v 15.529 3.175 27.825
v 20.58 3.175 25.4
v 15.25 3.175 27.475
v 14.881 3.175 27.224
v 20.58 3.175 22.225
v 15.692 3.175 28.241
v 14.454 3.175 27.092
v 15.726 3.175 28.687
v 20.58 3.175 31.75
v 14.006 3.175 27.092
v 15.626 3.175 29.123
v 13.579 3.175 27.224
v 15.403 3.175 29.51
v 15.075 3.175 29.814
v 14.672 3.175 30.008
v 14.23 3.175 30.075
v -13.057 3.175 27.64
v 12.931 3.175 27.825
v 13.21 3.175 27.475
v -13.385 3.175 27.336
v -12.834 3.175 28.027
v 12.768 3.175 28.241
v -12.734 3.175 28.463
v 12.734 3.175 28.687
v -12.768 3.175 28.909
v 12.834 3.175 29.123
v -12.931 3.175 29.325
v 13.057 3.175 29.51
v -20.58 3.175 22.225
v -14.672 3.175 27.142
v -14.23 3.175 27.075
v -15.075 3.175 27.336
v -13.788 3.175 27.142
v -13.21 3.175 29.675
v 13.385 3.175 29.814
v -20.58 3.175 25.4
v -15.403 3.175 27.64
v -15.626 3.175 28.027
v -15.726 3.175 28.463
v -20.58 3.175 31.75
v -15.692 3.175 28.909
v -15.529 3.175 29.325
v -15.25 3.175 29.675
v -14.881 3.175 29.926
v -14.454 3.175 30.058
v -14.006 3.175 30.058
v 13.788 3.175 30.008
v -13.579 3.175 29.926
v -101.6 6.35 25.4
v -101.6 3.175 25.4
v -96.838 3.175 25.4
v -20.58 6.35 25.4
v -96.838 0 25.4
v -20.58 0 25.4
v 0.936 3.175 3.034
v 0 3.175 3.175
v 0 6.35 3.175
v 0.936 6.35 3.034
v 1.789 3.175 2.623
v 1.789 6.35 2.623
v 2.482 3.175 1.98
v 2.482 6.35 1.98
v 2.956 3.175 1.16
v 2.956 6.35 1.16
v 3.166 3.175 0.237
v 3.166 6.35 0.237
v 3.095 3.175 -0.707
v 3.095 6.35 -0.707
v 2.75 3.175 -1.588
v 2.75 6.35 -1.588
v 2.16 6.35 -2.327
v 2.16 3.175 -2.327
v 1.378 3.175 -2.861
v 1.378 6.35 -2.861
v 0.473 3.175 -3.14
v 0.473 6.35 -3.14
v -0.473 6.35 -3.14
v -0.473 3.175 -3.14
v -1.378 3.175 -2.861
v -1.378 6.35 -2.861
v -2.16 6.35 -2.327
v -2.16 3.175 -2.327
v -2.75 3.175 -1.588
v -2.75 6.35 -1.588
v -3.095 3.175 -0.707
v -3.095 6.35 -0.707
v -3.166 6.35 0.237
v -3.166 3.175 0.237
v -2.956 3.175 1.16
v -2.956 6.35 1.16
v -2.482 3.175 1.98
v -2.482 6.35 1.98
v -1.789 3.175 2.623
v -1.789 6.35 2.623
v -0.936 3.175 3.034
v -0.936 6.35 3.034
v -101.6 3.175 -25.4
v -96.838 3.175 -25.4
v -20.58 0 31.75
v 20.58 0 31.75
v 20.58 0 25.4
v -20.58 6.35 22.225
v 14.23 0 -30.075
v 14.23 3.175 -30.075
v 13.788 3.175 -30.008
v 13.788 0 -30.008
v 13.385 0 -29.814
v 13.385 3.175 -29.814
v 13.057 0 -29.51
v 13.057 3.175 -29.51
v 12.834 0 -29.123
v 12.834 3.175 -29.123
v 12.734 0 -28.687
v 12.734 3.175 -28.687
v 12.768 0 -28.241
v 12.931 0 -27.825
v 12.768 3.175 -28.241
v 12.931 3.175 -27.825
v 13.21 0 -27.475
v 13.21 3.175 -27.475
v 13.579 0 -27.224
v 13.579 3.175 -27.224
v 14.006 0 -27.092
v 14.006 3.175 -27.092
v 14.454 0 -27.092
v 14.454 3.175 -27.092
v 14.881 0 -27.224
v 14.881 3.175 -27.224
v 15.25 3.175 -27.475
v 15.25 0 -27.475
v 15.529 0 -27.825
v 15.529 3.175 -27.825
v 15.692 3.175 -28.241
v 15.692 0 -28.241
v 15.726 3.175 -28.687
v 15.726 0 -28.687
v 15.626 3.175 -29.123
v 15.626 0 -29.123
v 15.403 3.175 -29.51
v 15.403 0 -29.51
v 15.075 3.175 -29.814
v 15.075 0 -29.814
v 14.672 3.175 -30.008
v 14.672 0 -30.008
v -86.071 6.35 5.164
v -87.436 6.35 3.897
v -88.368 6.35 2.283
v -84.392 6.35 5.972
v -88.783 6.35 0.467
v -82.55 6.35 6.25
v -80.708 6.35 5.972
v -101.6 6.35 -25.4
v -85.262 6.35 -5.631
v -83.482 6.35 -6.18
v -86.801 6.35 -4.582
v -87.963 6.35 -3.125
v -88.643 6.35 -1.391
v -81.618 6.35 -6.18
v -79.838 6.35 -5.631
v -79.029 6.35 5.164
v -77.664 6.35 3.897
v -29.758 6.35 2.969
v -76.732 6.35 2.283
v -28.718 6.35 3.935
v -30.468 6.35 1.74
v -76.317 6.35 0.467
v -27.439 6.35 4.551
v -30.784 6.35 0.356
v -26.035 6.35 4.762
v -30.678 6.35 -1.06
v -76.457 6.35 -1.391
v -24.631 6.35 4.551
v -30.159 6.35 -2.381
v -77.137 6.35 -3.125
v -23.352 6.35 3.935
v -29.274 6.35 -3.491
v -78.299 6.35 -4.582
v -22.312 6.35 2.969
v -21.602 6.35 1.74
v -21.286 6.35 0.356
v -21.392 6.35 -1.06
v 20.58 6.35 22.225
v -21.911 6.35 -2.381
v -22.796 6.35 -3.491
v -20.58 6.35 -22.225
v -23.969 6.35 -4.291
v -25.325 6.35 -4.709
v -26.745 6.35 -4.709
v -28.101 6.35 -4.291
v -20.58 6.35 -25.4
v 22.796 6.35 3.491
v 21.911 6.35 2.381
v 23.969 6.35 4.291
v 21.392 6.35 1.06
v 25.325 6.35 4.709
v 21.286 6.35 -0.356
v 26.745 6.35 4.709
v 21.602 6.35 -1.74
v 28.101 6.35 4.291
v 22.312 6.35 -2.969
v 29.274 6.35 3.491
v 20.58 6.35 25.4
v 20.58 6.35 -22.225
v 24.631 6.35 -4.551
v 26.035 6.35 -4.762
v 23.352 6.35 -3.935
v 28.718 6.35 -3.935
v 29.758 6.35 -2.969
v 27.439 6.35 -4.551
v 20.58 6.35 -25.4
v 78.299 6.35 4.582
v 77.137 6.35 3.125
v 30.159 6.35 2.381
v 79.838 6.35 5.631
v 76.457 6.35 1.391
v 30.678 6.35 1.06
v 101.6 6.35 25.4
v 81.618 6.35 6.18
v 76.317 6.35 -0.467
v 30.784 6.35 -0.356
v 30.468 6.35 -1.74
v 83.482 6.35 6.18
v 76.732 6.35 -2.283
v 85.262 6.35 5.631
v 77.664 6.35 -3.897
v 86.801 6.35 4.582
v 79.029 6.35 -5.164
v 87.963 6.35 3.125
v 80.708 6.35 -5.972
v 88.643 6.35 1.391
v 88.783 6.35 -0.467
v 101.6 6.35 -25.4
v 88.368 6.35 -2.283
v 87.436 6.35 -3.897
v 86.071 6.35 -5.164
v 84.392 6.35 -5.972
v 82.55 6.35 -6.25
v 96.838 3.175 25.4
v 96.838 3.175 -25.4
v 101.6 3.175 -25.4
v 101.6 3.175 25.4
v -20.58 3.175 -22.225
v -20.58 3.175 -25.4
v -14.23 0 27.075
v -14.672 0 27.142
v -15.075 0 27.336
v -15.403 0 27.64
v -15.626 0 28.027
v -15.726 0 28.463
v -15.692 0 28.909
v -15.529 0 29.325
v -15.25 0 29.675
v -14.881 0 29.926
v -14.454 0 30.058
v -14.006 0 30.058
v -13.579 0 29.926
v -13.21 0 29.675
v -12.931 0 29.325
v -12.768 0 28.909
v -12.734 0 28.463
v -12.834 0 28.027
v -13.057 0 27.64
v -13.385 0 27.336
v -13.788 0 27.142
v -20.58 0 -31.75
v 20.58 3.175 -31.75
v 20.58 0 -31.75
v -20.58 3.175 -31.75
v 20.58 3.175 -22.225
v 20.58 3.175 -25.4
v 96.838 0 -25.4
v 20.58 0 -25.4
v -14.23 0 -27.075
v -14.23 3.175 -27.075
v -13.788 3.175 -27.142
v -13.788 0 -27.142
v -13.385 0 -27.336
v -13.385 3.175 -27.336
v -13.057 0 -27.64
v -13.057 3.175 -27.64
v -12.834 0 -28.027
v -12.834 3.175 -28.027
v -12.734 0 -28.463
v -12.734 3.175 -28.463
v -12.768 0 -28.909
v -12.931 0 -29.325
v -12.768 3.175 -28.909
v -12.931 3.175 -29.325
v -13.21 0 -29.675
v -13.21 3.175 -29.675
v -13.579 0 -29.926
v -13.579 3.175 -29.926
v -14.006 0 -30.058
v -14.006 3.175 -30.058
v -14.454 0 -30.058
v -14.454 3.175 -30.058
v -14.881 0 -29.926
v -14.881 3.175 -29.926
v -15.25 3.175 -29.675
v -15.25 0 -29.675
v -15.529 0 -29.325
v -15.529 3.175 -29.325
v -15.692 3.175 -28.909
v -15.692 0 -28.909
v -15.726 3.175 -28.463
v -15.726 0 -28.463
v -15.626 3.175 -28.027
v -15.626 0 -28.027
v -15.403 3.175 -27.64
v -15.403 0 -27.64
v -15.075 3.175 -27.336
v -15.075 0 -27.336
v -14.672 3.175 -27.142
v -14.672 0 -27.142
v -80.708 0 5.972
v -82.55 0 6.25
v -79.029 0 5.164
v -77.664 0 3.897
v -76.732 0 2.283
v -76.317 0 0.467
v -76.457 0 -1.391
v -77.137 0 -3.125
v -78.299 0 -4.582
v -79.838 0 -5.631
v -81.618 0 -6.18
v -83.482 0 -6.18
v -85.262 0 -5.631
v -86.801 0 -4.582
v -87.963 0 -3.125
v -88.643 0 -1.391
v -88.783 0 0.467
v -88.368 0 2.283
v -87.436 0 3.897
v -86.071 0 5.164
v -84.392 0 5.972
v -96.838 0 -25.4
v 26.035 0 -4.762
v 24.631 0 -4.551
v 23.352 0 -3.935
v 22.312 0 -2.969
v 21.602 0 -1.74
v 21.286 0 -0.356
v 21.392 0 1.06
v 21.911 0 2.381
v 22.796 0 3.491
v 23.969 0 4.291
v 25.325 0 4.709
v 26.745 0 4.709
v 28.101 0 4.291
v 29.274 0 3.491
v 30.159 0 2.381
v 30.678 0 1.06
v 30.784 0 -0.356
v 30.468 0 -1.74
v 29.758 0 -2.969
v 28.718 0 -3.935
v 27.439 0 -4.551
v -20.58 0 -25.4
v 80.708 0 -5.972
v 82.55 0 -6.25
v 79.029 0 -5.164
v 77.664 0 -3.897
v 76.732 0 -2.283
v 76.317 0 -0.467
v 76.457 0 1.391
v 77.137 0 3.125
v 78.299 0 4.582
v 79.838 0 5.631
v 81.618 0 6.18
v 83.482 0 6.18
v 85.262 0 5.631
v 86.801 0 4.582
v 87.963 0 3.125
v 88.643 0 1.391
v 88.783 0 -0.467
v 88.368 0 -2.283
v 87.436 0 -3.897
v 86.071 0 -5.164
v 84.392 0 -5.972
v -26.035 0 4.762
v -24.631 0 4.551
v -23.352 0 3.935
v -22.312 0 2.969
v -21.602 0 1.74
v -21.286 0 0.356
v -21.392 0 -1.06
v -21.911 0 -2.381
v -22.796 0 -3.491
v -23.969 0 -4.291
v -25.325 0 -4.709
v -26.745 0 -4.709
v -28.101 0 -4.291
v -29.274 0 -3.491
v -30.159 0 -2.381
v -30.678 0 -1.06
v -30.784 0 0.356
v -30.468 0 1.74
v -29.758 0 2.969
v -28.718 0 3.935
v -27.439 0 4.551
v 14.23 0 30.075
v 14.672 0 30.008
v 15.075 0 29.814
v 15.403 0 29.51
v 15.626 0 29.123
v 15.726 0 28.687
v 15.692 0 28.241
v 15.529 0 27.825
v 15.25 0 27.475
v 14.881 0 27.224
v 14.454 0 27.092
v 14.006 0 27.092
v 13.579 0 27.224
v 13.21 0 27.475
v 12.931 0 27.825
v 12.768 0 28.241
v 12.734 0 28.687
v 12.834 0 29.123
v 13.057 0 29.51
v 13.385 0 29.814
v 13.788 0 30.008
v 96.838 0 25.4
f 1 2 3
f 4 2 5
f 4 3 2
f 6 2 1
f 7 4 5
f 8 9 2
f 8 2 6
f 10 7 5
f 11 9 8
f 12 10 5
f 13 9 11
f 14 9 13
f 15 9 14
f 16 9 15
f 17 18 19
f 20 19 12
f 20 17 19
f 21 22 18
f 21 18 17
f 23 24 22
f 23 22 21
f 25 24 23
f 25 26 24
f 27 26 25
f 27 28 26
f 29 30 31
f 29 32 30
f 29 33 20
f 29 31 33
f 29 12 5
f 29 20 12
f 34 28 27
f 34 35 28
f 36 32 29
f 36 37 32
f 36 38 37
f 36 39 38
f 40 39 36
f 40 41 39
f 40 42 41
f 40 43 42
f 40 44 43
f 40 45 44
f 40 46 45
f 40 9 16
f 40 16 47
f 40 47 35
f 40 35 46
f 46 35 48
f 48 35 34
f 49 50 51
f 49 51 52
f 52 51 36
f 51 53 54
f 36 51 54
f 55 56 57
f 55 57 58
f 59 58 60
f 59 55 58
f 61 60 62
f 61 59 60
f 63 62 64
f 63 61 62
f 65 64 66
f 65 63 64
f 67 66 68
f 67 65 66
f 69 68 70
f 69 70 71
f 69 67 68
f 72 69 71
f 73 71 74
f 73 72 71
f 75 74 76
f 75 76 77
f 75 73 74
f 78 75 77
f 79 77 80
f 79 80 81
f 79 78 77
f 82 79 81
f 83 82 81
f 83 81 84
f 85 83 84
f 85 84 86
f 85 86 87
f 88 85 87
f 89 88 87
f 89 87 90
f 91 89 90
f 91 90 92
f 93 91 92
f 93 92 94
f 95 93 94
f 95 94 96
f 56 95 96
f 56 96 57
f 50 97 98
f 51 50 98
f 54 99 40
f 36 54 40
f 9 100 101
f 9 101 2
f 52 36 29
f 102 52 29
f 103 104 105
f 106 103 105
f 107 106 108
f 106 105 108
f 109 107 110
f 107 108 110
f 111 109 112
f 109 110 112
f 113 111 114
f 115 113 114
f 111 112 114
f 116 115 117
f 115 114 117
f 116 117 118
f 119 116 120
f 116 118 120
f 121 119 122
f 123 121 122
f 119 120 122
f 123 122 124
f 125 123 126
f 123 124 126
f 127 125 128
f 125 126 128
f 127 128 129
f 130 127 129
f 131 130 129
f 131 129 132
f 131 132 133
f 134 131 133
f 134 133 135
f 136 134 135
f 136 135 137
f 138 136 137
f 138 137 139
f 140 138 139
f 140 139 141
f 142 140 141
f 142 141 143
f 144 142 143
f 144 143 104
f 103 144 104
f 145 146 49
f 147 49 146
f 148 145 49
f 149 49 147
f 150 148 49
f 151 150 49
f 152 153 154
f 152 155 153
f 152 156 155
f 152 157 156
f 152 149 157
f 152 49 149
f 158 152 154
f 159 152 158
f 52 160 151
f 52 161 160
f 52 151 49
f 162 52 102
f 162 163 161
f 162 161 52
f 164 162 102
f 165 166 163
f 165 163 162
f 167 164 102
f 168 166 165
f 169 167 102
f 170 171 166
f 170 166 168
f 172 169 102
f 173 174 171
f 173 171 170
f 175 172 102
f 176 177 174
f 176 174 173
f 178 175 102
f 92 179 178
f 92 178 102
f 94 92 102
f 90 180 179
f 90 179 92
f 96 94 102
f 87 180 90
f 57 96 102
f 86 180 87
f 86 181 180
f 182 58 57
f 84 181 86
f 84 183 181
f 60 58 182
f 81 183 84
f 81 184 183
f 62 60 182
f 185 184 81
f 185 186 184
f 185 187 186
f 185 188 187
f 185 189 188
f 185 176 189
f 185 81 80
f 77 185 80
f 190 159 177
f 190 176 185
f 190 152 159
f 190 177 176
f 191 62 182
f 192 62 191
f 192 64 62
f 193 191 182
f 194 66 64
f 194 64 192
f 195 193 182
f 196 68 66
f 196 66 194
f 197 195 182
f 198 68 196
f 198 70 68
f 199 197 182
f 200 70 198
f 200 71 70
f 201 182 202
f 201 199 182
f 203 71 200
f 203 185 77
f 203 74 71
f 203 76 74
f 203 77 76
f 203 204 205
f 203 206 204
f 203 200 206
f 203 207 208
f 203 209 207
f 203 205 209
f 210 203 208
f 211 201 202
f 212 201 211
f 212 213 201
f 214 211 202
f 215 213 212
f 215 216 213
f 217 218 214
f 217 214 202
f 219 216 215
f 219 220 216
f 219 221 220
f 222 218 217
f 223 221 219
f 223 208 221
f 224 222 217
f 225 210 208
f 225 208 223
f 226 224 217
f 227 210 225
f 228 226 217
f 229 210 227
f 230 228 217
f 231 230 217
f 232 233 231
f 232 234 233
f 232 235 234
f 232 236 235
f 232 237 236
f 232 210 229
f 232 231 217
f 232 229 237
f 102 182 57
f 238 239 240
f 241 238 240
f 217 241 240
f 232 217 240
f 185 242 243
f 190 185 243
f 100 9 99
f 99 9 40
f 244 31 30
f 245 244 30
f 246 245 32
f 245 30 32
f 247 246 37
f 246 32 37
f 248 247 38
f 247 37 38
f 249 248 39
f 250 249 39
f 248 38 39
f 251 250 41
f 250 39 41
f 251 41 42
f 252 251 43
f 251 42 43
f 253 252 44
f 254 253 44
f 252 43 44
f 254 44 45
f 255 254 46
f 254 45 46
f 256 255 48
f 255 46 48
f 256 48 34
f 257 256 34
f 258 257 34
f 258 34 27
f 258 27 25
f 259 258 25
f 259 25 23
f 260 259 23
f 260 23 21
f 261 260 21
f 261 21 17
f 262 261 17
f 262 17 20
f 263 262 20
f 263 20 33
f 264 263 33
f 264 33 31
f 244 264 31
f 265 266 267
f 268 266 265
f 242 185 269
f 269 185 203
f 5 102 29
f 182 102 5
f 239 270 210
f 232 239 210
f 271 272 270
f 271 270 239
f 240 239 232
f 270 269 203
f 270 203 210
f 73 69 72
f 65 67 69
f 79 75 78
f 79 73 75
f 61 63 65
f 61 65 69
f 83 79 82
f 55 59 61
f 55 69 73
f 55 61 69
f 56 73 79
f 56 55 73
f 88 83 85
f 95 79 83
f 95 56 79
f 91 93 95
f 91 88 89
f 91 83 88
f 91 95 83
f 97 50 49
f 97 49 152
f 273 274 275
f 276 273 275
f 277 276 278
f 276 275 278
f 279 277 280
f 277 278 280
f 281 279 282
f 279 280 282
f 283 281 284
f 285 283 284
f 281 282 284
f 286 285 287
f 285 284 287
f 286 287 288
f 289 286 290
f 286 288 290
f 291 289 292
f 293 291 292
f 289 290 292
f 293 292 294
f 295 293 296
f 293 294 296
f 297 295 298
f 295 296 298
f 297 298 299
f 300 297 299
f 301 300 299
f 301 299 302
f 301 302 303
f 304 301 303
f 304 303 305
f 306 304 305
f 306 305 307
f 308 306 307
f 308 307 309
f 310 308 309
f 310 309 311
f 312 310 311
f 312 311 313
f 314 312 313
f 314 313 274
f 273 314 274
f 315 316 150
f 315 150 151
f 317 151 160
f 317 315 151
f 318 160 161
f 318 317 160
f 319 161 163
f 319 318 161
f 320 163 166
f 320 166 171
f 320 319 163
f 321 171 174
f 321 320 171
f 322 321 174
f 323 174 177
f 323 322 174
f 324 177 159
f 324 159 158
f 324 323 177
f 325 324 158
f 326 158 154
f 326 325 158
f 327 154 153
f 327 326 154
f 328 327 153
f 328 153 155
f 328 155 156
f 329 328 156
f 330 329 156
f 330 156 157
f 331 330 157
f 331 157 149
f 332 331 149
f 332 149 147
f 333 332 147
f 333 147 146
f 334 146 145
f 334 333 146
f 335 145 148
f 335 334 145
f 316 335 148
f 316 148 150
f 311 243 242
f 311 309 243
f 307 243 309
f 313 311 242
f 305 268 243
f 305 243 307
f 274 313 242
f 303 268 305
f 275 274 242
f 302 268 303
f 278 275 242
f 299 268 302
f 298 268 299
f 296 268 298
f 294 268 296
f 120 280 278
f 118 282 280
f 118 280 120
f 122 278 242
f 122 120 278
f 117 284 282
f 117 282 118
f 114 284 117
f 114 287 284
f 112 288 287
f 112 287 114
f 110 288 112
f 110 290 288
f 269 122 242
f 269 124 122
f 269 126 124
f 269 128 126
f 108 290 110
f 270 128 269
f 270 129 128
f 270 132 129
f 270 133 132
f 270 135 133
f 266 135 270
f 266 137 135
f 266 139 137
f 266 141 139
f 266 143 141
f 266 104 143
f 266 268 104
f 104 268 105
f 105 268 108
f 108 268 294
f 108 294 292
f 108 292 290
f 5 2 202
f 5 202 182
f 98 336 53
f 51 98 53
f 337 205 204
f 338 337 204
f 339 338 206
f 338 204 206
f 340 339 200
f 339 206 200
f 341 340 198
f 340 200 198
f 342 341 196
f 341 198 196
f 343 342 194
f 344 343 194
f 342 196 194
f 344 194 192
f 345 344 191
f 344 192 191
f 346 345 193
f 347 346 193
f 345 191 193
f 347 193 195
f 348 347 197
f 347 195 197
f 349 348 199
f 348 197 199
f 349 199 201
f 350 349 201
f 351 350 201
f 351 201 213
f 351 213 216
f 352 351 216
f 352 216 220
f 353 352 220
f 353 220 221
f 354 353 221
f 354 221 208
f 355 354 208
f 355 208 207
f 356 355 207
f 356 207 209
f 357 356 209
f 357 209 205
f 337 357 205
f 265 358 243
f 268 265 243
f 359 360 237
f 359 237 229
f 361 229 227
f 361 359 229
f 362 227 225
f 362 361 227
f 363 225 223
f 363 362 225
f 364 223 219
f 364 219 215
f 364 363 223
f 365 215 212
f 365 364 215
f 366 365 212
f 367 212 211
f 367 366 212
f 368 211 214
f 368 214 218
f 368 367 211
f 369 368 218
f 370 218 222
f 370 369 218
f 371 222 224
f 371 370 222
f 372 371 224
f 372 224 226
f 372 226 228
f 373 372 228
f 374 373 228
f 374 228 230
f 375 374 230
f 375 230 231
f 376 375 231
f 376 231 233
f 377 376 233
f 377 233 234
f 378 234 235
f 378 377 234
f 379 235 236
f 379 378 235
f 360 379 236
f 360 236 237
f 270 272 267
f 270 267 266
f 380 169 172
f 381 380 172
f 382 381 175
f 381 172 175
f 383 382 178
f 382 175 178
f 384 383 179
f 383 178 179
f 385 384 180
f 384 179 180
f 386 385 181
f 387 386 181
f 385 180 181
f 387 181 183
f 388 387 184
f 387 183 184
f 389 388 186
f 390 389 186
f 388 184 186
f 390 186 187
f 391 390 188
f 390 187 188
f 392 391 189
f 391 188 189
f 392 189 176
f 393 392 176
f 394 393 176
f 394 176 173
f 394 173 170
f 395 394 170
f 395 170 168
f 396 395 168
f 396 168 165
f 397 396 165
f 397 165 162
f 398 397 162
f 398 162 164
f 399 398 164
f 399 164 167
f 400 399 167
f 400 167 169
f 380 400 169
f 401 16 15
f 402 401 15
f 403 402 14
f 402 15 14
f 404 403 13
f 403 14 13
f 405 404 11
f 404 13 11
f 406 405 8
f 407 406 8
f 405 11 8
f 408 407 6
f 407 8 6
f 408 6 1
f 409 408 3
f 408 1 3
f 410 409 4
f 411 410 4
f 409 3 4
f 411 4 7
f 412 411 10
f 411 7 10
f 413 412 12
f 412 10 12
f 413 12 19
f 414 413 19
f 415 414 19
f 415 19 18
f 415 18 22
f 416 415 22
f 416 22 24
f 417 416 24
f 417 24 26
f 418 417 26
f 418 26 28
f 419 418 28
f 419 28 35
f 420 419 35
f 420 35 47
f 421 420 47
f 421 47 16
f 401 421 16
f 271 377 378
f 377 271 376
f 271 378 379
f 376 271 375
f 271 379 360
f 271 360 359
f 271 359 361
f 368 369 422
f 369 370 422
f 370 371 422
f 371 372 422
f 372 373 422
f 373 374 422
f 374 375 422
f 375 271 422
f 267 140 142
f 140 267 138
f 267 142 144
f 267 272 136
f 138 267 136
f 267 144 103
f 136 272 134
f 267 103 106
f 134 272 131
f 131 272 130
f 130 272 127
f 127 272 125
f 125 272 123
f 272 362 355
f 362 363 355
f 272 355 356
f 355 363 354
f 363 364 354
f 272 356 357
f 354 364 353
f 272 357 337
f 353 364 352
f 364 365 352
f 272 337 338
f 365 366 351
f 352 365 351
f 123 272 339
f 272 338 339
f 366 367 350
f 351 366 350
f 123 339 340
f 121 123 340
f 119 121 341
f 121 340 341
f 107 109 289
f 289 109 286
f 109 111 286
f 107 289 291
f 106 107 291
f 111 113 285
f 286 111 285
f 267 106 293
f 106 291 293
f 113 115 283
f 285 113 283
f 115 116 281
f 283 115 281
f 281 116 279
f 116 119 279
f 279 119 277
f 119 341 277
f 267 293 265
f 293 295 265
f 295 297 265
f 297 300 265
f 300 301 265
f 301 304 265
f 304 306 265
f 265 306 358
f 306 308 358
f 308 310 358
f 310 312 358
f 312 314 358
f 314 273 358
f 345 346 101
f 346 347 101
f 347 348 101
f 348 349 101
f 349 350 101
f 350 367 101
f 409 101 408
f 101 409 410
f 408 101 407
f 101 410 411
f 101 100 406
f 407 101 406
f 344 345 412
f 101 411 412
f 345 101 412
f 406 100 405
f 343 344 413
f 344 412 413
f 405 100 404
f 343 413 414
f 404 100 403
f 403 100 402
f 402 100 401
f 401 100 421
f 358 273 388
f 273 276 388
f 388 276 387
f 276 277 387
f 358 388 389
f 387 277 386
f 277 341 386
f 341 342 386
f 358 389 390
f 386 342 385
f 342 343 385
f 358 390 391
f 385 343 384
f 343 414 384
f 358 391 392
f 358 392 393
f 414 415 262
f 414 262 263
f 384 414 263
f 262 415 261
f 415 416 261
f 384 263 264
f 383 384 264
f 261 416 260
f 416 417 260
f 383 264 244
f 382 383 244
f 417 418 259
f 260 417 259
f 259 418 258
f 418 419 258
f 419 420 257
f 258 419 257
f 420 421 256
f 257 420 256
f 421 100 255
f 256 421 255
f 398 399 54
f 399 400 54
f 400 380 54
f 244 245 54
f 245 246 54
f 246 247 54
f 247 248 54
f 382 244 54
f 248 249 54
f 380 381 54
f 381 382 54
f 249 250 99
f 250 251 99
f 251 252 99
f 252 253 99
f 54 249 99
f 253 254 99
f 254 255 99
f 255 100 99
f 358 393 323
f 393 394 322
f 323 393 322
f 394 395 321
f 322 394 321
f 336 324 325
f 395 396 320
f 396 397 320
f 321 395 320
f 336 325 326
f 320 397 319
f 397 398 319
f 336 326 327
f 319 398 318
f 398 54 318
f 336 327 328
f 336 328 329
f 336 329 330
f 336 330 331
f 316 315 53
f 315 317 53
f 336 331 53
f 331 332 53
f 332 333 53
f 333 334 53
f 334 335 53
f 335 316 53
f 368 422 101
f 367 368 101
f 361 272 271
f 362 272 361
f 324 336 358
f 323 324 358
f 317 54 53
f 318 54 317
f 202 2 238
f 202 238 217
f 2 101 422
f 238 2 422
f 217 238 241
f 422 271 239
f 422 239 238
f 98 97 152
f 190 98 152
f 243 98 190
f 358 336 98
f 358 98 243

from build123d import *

# Parameters (mm, degrees)
SKETCH1_W                = 203.2
SKETCH1_H                = 50.8
SKETCH1_R                = 6.25
SKETCH1_R_2              = 3.175
BOSS_EXTRUDE1_DEPTH      = 6.35
SKETCH2_W                = 41.159999976
SKETCH2_H                = 3.175
CUT_EXTRUDE1_DEPTH       = 3.175
SKETCH3_W                = 4.7625
SKETCH3_H                = 50.8
CUT_EXTRUDE2_DEPTH       = 3.175
SKETCH4_R                = 4.7625
CUT_EXTRUDE3_DEPTH       = 105.919218926
BOSS_EXTRUDE2_DEPTH      = 6.35
BOSS_EXTRUDE2_DEPTH_BACK = 57.15
SKETCH5_W                = 41.159999976
SKETCH5_H                = 3.175
SKETCH6_R                = 1.5
CUT_EXTRUDE4_DEPTH       = 6.35


with BuildPart() as part:
    # Sketch1 → Boss-Extrude1 (new body)
    with BuildSketch(Plane(origin=(0, 0, 0), x_dir=(1, 0, 0), z_dir=(0, 1, 0))):
        Rectangle(SKETCH1_W, SKETCH1_H)
        with Locations(Location((-82.55, 0, 0), (0, 0, 270))):
            Circle(SKETCH1_R, mode=Mode.SUBTRACT)
        with Locations(Location((82.55, 0, 0), (0, 0, 90))):
            Circle(SKETCH1_R, mode=Mode.SUBTRACT)
        with Locations(Location((0, 0, 0), (0, 0, 270))):
            Circle(SKETCH1_R_2, mode=Mode.SUBTRACT)
    extrude(amount=BOSS_EXTRUDE1_DEPTH)

    # Sketch2 → Cut-Extrude1 (cut)
    with BuildSketch(Plane(origin=(0, 6.35, 0), x_dir=(1, 0, 0), z_dir=(0, 1, 0))):
        with Locations((0, -23.8125)):
            Rectangle(SKETCH2_W, SKETCH2_H)
        with Locations((0, 23.8125)):
            Rectangle(SKETCH2_W, SKETCH2_H)
    extrude(amount=-CUT_EXTRUDE1_DEPTH, mode=Mode.SUBTRACT)

    # Sketch3 → Cut-Extrude2 (cut)
    with BuildSketch(Plane.XZ):
        with Locations((-99.21875, 0)):
            Rectangle(SKETCH3_W, SKETCH3_H)
        with Locations((99.21875, 0)):
            Rectangle(SKETCH3_W, SKETCH3_H)
    extrude(amount=-CUT_EXTRUDE2_DEPTH, mode=Mode.SUBTRACT)

    # Sketch4 → Cut-Extrude3 (cut, through all)
    with BuildSketch(Plane(origin=(0, 6.35, 0), x_dir=(1, 0, 0), z_dir=(0, 1, 0))):
        with Locations(Location((-26.035, 0, 0), (0, 0, 270))):
            Circle(SKETCH4_R)
        with Locations(Location((26.035, 0, 0), (0, 0, 90))):
            Circle(SKETCH4_R)
    extrude(amount=-CUT_EXTRUDE3_DEPTH, mode=Mode.SUBTRACT)

    # Sketch5 → Boss-Extrude2 (add, two sides: drawn at the far end of the back side and taken through both)
    with BuildSketch(Plane(origin=(0, 0, -25.4), x_dir=(-1, 0, 0), z_dir=(0, 0, -1)).offset(-BOSS_EXTRUDE2_DEPTH_BACK)):
        with Locations((0, 1.5875)):
            Rectangle(SKETCH5_W, SKETCH5_H)
    extrude(amount=BOSS_EXTRUDE2_DEPTH + BOSS_EXTRUDE2_DEPTH_BACK)

    # Sketch6 → Cut-Extrude4 (cut)
    with BuildSketch(Plane(origin=(0, 3.175, 0), x_dir=(1, 0, 0), z_dir=(0, 1, 0))):
        with Locations(Location((-14.229999988, 28.575, 0), (0, 0, 270))):
            Circle(SKETCH6_R)
        with Locations(Location((14.229999988, 28.575, 0), (0, 0, 90))):
            Circle(SKETCH6_R)
        with Locations(Location((14.229999988, -28.575, 0), (0, 0, 270))):
            Circle(SKETCH6_R)
        with Locations(Location((-14.229999988, -28.575, 0), (0, 0, 90))):
            Circle(SKETCH6_R)
    extrude(amount=-CUT_EXTRUDE4_DEPTH, mode=Mode.SUBTRACT)


solid = part.part
